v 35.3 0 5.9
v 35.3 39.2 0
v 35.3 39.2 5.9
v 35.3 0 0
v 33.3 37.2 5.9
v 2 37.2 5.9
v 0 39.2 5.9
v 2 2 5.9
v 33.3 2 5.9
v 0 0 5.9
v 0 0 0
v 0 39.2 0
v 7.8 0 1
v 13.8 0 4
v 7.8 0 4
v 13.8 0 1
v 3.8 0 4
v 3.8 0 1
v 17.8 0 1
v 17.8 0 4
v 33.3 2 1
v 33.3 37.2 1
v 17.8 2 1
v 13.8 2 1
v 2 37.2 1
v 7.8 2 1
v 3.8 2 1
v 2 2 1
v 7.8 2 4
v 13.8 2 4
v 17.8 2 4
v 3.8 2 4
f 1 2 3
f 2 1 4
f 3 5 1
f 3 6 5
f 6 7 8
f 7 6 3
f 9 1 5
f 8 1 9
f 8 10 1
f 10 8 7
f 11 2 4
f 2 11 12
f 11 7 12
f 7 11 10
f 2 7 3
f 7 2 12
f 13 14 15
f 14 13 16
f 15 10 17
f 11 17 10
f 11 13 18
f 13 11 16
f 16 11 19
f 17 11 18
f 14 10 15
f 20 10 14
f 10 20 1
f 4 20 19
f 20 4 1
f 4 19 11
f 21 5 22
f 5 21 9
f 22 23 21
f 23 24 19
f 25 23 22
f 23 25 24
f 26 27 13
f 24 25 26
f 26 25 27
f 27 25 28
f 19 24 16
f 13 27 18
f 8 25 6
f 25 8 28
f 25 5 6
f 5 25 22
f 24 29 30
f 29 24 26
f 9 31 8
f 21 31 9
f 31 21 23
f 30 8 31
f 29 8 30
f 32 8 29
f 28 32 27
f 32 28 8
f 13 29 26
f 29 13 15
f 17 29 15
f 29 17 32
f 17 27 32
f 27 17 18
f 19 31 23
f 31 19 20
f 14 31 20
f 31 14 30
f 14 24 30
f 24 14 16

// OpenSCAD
difference()
{
	cube([35.3,39.2,5.9]);
	translate([2,2,1])
		cube([31.3,35.2,5.9]);	
	translate([3.8,-1,1])
		cube([4,5,3]);
	translate([13.8,-1,1])
		cube([4,5,3]);
}
